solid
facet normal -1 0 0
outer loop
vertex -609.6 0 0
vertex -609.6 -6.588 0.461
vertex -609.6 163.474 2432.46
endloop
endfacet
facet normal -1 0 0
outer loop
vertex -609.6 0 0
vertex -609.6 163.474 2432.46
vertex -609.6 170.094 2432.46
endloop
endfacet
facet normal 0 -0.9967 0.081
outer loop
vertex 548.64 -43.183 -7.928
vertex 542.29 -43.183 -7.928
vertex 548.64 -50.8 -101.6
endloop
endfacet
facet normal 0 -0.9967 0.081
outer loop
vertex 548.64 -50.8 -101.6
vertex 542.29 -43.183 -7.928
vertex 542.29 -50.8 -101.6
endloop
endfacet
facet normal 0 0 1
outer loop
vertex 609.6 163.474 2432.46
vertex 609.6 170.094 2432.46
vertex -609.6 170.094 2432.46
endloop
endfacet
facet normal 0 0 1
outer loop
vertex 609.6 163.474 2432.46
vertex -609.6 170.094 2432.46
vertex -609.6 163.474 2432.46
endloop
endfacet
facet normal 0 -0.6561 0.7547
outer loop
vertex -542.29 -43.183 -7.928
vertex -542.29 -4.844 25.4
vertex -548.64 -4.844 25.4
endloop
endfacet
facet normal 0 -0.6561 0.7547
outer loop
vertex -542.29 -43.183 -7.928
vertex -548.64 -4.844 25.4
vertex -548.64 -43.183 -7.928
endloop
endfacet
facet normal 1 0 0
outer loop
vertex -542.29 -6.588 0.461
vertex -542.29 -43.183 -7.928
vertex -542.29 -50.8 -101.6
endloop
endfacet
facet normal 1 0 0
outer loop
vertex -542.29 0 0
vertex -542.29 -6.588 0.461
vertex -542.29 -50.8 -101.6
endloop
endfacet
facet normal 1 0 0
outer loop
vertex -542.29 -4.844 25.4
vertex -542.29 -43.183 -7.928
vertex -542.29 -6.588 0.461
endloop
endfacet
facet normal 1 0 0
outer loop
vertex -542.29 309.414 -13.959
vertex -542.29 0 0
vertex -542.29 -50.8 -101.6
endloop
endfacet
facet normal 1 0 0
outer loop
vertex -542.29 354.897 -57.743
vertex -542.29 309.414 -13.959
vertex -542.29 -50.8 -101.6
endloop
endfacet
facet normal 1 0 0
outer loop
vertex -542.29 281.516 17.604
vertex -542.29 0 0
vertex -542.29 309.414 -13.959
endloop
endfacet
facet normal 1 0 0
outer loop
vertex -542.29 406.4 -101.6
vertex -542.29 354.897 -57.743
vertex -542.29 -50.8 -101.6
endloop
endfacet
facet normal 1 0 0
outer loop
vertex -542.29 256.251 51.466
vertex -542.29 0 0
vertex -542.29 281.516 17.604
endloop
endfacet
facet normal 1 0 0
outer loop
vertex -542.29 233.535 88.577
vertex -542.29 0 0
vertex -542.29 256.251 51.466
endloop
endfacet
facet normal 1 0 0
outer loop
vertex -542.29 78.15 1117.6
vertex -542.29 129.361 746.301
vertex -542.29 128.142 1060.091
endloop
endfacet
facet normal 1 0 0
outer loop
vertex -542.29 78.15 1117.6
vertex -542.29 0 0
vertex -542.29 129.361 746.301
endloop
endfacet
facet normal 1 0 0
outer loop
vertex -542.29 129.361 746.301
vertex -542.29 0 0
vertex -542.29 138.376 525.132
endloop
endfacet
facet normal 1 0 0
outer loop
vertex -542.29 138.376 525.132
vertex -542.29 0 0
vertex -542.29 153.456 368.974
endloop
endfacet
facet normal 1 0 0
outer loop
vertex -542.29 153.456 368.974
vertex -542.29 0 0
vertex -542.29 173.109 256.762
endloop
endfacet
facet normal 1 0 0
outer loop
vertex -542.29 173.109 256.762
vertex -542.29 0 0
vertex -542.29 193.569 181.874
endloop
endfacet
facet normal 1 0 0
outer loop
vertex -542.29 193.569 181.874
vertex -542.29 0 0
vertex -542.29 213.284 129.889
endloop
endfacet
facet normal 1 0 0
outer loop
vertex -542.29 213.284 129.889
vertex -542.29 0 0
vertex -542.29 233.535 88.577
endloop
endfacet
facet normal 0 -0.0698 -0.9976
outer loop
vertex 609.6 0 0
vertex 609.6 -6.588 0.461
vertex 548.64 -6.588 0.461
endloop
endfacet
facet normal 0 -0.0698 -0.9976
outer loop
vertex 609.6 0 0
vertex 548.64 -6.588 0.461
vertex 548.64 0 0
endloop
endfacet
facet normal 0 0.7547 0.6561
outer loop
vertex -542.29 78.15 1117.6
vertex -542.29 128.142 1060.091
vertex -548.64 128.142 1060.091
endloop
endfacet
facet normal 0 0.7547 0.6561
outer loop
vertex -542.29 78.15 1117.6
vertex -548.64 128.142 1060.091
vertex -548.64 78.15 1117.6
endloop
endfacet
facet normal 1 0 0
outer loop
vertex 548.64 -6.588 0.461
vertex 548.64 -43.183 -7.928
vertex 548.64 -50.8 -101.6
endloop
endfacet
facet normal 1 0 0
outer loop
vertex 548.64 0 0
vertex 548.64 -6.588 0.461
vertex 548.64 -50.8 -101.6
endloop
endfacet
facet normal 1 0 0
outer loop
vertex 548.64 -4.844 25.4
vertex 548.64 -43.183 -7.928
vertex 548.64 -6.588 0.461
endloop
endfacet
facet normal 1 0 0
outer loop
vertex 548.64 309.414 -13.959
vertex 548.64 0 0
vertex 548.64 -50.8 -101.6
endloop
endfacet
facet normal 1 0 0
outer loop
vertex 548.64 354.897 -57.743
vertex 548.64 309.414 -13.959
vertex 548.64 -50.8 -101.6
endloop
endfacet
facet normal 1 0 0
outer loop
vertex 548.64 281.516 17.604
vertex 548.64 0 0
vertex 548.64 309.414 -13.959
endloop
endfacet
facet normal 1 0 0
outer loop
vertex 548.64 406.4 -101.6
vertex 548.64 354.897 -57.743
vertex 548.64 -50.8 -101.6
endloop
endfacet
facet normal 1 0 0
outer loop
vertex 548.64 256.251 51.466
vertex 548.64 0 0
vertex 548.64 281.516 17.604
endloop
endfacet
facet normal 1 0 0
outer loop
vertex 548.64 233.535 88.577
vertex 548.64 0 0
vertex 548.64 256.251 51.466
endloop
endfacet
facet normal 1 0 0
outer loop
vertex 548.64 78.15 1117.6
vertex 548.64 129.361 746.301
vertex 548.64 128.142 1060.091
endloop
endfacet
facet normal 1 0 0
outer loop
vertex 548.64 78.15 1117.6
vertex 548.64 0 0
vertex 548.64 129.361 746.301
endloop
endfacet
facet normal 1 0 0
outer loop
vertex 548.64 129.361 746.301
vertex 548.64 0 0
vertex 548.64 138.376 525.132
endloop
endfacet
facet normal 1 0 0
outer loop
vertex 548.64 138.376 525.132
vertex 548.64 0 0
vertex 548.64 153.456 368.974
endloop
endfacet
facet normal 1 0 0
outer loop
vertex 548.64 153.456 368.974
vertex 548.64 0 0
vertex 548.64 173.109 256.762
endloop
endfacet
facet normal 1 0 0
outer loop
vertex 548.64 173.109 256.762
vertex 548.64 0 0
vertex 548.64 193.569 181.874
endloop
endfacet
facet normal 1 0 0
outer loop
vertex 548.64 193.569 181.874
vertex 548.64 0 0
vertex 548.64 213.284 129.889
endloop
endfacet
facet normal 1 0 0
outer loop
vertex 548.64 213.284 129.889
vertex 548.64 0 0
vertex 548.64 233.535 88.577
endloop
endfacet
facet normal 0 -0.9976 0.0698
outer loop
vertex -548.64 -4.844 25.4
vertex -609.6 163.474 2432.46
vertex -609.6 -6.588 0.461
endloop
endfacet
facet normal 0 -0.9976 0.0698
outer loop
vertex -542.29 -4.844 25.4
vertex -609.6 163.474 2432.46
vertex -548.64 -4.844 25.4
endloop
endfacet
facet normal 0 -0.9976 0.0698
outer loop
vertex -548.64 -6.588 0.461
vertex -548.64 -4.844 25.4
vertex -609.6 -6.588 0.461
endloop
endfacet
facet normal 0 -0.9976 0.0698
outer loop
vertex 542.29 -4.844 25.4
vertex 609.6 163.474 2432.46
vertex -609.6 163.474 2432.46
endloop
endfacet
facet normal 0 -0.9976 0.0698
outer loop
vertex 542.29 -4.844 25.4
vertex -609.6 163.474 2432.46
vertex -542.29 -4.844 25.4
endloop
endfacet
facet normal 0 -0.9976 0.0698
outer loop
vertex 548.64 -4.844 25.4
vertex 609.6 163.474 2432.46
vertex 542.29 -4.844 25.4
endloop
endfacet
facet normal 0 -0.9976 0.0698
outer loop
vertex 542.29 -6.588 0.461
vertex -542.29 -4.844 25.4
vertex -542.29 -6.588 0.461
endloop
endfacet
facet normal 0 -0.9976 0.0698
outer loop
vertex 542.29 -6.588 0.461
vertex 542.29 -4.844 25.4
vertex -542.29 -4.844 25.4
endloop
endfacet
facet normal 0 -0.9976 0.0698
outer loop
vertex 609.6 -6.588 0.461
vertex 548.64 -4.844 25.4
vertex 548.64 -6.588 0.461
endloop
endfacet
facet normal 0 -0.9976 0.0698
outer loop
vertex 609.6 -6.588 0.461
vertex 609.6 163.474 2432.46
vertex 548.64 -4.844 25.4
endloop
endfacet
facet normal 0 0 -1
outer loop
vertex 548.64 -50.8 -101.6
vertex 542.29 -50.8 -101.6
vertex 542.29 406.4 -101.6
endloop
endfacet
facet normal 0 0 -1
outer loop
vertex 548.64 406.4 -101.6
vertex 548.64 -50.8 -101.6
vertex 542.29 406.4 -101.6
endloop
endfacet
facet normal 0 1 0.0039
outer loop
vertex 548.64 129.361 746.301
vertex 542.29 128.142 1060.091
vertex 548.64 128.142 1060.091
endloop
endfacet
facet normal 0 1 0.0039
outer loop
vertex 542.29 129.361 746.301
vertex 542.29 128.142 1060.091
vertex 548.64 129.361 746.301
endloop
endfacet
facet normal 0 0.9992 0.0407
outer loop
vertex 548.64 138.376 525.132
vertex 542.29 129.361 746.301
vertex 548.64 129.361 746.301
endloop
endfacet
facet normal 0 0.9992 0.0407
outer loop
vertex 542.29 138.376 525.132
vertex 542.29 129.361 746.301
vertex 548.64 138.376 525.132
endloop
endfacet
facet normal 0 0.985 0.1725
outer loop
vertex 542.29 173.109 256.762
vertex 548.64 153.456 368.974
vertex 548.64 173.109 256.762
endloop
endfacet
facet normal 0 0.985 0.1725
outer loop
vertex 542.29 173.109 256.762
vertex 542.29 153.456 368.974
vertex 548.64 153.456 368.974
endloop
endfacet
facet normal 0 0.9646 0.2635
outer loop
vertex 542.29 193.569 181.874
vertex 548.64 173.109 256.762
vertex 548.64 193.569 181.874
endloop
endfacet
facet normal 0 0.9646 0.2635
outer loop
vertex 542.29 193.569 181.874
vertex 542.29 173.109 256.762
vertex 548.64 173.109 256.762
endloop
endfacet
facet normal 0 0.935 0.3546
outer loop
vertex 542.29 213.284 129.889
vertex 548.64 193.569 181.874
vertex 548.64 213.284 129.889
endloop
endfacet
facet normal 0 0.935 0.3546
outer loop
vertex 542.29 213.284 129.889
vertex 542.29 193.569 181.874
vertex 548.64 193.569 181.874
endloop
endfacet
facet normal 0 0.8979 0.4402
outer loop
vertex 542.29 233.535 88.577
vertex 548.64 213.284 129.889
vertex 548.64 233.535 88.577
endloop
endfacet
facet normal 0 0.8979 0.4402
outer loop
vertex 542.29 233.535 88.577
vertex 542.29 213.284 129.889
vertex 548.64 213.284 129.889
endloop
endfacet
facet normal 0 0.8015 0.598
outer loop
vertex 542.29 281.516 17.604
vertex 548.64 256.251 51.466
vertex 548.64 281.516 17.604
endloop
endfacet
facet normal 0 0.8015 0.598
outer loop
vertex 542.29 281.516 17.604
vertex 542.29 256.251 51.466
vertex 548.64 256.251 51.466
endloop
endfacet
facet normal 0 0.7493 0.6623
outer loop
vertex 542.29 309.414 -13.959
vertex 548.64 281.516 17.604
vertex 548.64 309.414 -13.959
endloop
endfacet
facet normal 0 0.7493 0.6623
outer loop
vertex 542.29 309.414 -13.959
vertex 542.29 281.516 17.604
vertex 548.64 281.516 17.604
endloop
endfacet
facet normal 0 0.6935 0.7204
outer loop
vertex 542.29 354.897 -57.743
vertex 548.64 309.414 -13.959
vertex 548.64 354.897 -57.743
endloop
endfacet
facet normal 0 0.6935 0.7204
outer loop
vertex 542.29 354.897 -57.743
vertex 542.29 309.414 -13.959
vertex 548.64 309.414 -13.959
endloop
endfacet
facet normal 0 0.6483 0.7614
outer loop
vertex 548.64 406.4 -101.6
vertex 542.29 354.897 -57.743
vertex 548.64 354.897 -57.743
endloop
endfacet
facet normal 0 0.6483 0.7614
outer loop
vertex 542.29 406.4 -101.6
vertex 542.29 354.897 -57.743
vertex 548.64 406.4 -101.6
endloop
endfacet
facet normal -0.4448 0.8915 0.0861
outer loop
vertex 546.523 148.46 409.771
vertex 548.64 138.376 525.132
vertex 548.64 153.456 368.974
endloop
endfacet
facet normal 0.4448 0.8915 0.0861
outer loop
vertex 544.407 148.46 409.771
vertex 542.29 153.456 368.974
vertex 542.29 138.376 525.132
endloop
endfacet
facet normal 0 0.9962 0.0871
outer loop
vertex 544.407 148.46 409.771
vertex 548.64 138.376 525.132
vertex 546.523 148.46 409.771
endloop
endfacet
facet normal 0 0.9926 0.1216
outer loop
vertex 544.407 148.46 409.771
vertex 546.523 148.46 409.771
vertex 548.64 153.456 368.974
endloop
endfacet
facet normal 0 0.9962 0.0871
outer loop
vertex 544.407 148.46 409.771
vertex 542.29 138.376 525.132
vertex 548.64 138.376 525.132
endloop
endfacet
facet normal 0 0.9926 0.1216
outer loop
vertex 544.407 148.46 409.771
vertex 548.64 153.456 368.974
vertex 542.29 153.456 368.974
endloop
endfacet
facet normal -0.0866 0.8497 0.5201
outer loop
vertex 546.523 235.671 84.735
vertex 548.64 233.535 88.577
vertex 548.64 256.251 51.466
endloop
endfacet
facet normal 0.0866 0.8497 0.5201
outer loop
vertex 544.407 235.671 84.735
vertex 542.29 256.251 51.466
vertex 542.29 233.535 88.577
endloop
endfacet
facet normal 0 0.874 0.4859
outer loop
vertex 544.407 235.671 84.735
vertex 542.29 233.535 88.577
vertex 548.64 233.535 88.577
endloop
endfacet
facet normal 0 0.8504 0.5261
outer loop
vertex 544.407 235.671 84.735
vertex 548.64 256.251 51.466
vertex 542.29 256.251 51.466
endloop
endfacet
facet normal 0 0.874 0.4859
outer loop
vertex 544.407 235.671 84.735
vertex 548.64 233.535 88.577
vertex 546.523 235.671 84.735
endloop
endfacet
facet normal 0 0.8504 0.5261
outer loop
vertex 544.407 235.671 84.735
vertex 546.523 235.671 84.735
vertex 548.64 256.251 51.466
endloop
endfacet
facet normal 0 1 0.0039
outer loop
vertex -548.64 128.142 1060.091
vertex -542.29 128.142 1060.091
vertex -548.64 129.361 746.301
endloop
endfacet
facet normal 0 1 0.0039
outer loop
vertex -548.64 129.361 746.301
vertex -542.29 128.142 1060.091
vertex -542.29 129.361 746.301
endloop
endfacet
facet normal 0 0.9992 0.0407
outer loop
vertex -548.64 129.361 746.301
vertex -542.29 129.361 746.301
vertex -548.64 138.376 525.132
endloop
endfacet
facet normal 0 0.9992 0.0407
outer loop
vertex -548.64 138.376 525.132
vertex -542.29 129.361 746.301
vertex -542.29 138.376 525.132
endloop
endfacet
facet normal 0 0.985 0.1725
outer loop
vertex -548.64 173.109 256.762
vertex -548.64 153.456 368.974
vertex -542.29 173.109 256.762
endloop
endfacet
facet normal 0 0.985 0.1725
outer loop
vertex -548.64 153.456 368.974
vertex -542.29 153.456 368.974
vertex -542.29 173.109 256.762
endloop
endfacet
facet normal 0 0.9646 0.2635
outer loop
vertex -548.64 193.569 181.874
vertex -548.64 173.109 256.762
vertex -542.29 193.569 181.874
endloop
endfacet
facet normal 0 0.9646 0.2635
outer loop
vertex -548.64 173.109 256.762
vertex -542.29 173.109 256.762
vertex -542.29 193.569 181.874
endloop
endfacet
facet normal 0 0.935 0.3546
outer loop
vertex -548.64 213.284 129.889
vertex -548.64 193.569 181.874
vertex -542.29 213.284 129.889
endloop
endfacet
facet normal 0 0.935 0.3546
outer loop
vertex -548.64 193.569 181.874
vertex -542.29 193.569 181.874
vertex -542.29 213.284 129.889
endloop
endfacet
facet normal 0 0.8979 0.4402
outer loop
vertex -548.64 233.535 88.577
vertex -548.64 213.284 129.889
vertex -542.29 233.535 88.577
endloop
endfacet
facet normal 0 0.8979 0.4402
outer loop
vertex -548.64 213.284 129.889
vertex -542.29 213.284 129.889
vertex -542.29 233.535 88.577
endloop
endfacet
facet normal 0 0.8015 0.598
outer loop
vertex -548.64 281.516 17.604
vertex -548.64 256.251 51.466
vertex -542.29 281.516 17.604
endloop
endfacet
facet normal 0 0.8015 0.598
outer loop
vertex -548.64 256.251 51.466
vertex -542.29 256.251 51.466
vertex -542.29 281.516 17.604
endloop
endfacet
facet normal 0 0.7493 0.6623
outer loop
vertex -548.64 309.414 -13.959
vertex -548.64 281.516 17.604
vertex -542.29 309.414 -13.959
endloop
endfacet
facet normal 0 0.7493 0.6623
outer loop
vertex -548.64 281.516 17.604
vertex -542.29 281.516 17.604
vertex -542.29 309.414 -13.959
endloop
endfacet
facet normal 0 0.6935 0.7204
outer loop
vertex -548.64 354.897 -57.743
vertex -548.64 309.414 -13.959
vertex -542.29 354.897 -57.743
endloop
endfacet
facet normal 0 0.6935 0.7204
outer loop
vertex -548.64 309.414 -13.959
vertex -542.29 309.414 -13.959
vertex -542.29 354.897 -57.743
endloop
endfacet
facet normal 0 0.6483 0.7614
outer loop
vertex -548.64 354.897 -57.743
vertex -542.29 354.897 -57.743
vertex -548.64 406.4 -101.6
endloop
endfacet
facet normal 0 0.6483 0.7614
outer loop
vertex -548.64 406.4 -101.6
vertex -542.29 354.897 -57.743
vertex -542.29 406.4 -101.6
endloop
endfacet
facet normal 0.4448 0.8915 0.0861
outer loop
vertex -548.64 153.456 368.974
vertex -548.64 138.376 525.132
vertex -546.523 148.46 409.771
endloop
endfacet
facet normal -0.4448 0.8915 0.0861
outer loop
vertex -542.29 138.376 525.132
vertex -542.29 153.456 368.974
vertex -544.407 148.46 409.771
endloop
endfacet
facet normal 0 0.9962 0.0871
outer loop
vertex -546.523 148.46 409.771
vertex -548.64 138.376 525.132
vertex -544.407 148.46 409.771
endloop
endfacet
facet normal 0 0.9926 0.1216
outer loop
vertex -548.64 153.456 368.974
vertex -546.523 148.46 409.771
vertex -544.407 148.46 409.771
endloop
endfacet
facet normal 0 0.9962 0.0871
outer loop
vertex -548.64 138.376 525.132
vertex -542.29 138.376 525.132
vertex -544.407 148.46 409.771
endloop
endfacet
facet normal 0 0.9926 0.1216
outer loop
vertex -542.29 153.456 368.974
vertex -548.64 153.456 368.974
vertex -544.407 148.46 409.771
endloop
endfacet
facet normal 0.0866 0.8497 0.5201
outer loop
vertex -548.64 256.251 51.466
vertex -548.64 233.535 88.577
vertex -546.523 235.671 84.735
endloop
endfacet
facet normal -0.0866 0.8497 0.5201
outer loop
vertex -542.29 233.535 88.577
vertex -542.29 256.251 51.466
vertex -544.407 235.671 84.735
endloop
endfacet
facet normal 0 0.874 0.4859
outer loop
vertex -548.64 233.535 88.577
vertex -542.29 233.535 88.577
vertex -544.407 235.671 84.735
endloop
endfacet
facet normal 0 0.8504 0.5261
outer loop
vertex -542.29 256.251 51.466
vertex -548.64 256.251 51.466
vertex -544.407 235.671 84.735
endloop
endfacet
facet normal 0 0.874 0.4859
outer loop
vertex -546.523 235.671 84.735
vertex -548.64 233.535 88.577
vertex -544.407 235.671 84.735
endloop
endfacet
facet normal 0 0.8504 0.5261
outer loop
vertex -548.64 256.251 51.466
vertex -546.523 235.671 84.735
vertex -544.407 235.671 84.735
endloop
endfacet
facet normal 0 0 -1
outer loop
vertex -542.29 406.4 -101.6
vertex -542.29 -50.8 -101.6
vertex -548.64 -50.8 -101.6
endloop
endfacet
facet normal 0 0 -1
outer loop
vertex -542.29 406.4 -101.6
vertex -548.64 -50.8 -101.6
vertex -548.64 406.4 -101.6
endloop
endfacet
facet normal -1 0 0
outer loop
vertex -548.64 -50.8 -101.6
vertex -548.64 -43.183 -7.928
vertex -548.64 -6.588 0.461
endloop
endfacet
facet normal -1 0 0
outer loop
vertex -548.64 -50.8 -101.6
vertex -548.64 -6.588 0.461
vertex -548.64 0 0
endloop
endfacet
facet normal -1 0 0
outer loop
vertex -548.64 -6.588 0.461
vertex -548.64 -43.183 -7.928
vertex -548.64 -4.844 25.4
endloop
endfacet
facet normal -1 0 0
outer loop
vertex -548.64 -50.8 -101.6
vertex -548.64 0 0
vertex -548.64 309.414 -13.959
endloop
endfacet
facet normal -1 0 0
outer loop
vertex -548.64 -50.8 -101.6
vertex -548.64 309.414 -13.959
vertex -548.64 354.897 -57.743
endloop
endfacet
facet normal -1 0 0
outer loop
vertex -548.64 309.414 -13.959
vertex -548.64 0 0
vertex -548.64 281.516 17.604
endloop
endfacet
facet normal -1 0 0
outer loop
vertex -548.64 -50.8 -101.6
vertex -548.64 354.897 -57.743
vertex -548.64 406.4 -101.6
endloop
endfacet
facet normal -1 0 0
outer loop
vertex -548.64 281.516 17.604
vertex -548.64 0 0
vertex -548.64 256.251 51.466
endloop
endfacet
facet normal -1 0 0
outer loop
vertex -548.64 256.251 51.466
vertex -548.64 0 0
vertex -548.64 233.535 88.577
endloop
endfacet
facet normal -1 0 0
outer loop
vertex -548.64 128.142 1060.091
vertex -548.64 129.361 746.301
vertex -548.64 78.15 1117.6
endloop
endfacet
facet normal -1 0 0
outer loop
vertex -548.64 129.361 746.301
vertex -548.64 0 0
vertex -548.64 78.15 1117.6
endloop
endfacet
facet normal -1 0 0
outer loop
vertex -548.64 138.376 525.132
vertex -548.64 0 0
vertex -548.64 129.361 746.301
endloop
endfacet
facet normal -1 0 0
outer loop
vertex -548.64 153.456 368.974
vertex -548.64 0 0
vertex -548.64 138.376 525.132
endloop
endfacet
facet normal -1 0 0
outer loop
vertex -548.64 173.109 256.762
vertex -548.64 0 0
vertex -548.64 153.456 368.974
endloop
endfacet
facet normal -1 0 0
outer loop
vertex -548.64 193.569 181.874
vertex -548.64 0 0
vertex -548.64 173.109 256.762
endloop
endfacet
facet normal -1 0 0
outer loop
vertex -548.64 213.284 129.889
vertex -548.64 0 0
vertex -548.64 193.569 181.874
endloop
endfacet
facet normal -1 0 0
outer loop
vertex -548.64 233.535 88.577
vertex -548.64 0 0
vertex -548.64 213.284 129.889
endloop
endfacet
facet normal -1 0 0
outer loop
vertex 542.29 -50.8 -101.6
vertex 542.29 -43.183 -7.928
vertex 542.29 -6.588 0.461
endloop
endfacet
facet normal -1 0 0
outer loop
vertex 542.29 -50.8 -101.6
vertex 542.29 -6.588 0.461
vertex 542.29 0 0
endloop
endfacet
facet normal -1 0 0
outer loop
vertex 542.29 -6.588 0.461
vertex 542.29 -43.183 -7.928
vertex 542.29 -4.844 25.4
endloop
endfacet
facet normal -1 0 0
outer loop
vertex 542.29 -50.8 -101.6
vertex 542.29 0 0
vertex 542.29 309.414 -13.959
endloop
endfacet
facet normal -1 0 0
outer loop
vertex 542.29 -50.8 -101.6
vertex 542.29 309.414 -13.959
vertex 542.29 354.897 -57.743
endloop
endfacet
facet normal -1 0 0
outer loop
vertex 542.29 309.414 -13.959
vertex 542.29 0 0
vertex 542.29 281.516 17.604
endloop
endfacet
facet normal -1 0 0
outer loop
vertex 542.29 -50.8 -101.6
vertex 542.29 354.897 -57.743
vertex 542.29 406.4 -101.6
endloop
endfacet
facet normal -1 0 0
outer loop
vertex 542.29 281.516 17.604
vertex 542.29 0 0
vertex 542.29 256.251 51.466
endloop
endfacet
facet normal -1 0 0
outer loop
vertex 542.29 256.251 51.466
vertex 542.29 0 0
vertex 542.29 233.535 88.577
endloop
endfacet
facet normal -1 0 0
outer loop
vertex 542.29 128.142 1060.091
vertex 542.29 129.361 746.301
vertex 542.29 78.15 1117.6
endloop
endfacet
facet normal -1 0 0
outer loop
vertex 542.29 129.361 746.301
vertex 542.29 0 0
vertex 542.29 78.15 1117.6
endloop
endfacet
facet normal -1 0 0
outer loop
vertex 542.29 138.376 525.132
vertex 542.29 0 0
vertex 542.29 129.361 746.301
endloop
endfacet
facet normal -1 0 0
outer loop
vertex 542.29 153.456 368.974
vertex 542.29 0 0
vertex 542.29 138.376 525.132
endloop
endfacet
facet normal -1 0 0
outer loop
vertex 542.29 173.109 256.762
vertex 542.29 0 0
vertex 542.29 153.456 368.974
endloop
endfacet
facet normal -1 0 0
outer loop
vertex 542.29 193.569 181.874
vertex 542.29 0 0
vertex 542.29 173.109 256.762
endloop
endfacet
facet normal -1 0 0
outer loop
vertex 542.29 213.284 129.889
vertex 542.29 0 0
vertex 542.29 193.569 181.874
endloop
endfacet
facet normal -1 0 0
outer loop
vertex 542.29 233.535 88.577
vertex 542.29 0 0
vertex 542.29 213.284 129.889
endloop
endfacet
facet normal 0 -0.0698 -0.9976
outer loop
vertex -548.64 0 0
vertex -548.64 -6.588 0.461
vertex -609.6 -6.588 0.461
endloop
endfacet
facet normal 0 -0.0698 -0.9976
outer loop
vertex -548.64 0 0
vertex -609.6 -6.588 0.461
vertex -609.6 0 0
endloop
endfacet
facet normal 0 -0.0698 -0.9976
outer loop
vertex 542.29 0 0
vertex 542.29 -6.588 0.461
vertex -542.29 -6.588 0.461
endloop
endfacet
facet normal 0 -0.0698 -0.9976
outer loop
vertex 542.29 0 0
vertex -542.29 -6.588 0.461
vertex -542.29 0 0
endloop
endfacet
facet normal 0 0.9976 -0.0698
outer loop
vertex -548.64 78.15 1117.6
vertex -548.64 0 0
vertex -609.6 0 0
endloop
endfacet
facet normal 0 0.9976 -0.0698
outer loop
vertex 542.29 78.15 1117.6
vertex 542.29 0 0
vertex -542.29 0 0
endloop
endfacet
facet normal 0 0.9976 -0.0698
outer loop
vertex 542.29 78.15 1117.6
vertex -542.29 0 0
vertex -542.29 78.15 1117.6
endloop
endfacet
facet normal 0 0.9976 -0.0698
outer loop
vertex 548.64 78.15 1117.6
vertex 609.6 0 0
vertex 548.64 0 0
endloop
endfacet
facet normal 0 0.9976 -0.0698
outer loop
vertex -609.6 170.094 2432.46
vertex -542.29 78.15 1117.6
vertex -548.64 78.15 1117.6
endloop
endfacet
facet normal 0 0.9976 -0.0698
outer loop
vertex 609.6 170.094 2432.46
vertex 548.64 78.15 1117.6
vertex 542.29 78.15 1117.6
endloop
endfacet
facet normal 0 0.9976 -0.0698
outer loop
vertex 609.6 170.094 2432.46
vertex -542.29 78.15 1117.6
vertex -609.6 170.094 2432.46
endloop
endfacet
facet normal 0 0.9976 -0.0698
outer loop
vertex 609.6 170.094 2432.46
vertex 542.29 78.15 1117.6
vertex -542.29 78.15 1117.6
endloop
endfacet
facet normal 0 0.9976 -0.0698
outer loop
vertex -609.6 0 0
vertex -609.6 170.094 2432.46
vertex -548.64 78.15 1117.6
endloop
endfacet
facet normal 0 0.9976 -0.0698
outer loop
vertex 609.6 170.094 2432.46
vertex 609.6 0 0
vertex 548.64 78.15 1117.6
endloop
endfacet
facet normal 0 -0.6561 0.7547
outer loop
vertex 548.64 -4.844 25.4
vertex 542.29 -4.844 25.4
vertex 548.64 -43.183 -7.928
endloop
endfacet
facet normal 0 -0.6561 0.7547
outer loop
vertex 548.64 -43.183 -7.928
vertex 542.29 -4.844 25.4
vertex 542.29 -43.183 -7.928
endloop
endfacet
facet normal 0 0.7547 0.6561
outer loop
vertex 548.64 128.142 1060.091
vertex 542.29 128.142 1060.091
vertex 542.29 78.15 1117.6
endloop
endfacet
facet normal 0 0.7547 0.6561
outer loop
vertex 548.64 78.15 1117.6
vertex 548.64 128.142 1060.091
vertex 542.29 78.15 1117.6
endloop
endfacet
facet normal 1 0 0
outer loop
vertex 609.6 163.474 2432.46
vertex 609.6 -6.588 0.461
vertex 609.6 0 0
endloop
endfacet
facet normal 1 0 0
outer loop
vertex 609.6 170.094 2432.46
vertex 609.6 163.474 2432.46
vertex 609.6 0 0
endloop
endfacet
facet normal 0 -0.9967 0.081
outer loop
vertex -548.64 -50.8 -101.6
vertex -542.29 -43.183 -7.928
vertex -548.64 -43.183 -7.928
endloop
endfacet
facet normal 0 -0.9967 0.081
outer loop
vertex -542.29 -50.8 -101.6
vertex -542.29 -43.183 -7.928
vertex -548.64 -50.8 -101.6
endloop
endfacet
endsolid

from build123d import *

# Parameters (mm, degrees)
F2_DEPTH = 609.6
F3_START = 542.29
F3_DEPTH = 6.35


# Not quite as in the source:
# - a length typed as a fraction of an inch, garbled in the dataset ("3 / 203.2 mm" for 3/8 in), is restored


with BuildPart() as f2:
    # F0 (on Right) → F2 (new body, symmetric)
    with BuildSketch(Plane.YZ):
        Polygon((-6.5879129879, 0.4606717526), (0, 0), (170.0941855777, 2432.4601801536), (163.4740592827, 2432.4601801536), align=None)
    extrude(amount=F2_DEPTH, both=True)

    # F1 (on Right) → F3 (join)
    with BuildSketch(Plane.YZ.offset(F3_START)):
        with BuildLine():
            Line((-43.1832319469, -7.9277986727), (-50.8, -101.6))
            Line((-50.8, -101.6), (406.4, -101.6))
            add(Edge.make_bspline(
                [(128.1419030371, 1060.091129987), (120.5565482378, 184.9341541529), (188.3697360754, 77.5789916515), (406.4, -101.6)],
                knots=[0, 0, 0, 0, 1194.5517360148, 1194.5517360148, 1194.5517360148, 1194.5517360148], degree=3))
            Line((128.1419030371, 1060.091129987), (78.1502050281, 1117.6))
            Line((78.1502050281, 1117.6), (0, 0))
            Line((0, 0), (-6.5879129879, 0.4606717526))
            Line((-6.5879129879, 0.4606717526), (-4.8439852716, 25.4))
            Line((-4.8439852716, 25.4), (-43.1832319469, -7.9277986727))
        make_face()
    extrude(amount=F3_DEPTH)

    # F4: F2 across plane


with BuildPart() as f2_1:
    add(f2.part)
    add(f2.part.mirror(Plane.YZ))


solid = f2_1.part
